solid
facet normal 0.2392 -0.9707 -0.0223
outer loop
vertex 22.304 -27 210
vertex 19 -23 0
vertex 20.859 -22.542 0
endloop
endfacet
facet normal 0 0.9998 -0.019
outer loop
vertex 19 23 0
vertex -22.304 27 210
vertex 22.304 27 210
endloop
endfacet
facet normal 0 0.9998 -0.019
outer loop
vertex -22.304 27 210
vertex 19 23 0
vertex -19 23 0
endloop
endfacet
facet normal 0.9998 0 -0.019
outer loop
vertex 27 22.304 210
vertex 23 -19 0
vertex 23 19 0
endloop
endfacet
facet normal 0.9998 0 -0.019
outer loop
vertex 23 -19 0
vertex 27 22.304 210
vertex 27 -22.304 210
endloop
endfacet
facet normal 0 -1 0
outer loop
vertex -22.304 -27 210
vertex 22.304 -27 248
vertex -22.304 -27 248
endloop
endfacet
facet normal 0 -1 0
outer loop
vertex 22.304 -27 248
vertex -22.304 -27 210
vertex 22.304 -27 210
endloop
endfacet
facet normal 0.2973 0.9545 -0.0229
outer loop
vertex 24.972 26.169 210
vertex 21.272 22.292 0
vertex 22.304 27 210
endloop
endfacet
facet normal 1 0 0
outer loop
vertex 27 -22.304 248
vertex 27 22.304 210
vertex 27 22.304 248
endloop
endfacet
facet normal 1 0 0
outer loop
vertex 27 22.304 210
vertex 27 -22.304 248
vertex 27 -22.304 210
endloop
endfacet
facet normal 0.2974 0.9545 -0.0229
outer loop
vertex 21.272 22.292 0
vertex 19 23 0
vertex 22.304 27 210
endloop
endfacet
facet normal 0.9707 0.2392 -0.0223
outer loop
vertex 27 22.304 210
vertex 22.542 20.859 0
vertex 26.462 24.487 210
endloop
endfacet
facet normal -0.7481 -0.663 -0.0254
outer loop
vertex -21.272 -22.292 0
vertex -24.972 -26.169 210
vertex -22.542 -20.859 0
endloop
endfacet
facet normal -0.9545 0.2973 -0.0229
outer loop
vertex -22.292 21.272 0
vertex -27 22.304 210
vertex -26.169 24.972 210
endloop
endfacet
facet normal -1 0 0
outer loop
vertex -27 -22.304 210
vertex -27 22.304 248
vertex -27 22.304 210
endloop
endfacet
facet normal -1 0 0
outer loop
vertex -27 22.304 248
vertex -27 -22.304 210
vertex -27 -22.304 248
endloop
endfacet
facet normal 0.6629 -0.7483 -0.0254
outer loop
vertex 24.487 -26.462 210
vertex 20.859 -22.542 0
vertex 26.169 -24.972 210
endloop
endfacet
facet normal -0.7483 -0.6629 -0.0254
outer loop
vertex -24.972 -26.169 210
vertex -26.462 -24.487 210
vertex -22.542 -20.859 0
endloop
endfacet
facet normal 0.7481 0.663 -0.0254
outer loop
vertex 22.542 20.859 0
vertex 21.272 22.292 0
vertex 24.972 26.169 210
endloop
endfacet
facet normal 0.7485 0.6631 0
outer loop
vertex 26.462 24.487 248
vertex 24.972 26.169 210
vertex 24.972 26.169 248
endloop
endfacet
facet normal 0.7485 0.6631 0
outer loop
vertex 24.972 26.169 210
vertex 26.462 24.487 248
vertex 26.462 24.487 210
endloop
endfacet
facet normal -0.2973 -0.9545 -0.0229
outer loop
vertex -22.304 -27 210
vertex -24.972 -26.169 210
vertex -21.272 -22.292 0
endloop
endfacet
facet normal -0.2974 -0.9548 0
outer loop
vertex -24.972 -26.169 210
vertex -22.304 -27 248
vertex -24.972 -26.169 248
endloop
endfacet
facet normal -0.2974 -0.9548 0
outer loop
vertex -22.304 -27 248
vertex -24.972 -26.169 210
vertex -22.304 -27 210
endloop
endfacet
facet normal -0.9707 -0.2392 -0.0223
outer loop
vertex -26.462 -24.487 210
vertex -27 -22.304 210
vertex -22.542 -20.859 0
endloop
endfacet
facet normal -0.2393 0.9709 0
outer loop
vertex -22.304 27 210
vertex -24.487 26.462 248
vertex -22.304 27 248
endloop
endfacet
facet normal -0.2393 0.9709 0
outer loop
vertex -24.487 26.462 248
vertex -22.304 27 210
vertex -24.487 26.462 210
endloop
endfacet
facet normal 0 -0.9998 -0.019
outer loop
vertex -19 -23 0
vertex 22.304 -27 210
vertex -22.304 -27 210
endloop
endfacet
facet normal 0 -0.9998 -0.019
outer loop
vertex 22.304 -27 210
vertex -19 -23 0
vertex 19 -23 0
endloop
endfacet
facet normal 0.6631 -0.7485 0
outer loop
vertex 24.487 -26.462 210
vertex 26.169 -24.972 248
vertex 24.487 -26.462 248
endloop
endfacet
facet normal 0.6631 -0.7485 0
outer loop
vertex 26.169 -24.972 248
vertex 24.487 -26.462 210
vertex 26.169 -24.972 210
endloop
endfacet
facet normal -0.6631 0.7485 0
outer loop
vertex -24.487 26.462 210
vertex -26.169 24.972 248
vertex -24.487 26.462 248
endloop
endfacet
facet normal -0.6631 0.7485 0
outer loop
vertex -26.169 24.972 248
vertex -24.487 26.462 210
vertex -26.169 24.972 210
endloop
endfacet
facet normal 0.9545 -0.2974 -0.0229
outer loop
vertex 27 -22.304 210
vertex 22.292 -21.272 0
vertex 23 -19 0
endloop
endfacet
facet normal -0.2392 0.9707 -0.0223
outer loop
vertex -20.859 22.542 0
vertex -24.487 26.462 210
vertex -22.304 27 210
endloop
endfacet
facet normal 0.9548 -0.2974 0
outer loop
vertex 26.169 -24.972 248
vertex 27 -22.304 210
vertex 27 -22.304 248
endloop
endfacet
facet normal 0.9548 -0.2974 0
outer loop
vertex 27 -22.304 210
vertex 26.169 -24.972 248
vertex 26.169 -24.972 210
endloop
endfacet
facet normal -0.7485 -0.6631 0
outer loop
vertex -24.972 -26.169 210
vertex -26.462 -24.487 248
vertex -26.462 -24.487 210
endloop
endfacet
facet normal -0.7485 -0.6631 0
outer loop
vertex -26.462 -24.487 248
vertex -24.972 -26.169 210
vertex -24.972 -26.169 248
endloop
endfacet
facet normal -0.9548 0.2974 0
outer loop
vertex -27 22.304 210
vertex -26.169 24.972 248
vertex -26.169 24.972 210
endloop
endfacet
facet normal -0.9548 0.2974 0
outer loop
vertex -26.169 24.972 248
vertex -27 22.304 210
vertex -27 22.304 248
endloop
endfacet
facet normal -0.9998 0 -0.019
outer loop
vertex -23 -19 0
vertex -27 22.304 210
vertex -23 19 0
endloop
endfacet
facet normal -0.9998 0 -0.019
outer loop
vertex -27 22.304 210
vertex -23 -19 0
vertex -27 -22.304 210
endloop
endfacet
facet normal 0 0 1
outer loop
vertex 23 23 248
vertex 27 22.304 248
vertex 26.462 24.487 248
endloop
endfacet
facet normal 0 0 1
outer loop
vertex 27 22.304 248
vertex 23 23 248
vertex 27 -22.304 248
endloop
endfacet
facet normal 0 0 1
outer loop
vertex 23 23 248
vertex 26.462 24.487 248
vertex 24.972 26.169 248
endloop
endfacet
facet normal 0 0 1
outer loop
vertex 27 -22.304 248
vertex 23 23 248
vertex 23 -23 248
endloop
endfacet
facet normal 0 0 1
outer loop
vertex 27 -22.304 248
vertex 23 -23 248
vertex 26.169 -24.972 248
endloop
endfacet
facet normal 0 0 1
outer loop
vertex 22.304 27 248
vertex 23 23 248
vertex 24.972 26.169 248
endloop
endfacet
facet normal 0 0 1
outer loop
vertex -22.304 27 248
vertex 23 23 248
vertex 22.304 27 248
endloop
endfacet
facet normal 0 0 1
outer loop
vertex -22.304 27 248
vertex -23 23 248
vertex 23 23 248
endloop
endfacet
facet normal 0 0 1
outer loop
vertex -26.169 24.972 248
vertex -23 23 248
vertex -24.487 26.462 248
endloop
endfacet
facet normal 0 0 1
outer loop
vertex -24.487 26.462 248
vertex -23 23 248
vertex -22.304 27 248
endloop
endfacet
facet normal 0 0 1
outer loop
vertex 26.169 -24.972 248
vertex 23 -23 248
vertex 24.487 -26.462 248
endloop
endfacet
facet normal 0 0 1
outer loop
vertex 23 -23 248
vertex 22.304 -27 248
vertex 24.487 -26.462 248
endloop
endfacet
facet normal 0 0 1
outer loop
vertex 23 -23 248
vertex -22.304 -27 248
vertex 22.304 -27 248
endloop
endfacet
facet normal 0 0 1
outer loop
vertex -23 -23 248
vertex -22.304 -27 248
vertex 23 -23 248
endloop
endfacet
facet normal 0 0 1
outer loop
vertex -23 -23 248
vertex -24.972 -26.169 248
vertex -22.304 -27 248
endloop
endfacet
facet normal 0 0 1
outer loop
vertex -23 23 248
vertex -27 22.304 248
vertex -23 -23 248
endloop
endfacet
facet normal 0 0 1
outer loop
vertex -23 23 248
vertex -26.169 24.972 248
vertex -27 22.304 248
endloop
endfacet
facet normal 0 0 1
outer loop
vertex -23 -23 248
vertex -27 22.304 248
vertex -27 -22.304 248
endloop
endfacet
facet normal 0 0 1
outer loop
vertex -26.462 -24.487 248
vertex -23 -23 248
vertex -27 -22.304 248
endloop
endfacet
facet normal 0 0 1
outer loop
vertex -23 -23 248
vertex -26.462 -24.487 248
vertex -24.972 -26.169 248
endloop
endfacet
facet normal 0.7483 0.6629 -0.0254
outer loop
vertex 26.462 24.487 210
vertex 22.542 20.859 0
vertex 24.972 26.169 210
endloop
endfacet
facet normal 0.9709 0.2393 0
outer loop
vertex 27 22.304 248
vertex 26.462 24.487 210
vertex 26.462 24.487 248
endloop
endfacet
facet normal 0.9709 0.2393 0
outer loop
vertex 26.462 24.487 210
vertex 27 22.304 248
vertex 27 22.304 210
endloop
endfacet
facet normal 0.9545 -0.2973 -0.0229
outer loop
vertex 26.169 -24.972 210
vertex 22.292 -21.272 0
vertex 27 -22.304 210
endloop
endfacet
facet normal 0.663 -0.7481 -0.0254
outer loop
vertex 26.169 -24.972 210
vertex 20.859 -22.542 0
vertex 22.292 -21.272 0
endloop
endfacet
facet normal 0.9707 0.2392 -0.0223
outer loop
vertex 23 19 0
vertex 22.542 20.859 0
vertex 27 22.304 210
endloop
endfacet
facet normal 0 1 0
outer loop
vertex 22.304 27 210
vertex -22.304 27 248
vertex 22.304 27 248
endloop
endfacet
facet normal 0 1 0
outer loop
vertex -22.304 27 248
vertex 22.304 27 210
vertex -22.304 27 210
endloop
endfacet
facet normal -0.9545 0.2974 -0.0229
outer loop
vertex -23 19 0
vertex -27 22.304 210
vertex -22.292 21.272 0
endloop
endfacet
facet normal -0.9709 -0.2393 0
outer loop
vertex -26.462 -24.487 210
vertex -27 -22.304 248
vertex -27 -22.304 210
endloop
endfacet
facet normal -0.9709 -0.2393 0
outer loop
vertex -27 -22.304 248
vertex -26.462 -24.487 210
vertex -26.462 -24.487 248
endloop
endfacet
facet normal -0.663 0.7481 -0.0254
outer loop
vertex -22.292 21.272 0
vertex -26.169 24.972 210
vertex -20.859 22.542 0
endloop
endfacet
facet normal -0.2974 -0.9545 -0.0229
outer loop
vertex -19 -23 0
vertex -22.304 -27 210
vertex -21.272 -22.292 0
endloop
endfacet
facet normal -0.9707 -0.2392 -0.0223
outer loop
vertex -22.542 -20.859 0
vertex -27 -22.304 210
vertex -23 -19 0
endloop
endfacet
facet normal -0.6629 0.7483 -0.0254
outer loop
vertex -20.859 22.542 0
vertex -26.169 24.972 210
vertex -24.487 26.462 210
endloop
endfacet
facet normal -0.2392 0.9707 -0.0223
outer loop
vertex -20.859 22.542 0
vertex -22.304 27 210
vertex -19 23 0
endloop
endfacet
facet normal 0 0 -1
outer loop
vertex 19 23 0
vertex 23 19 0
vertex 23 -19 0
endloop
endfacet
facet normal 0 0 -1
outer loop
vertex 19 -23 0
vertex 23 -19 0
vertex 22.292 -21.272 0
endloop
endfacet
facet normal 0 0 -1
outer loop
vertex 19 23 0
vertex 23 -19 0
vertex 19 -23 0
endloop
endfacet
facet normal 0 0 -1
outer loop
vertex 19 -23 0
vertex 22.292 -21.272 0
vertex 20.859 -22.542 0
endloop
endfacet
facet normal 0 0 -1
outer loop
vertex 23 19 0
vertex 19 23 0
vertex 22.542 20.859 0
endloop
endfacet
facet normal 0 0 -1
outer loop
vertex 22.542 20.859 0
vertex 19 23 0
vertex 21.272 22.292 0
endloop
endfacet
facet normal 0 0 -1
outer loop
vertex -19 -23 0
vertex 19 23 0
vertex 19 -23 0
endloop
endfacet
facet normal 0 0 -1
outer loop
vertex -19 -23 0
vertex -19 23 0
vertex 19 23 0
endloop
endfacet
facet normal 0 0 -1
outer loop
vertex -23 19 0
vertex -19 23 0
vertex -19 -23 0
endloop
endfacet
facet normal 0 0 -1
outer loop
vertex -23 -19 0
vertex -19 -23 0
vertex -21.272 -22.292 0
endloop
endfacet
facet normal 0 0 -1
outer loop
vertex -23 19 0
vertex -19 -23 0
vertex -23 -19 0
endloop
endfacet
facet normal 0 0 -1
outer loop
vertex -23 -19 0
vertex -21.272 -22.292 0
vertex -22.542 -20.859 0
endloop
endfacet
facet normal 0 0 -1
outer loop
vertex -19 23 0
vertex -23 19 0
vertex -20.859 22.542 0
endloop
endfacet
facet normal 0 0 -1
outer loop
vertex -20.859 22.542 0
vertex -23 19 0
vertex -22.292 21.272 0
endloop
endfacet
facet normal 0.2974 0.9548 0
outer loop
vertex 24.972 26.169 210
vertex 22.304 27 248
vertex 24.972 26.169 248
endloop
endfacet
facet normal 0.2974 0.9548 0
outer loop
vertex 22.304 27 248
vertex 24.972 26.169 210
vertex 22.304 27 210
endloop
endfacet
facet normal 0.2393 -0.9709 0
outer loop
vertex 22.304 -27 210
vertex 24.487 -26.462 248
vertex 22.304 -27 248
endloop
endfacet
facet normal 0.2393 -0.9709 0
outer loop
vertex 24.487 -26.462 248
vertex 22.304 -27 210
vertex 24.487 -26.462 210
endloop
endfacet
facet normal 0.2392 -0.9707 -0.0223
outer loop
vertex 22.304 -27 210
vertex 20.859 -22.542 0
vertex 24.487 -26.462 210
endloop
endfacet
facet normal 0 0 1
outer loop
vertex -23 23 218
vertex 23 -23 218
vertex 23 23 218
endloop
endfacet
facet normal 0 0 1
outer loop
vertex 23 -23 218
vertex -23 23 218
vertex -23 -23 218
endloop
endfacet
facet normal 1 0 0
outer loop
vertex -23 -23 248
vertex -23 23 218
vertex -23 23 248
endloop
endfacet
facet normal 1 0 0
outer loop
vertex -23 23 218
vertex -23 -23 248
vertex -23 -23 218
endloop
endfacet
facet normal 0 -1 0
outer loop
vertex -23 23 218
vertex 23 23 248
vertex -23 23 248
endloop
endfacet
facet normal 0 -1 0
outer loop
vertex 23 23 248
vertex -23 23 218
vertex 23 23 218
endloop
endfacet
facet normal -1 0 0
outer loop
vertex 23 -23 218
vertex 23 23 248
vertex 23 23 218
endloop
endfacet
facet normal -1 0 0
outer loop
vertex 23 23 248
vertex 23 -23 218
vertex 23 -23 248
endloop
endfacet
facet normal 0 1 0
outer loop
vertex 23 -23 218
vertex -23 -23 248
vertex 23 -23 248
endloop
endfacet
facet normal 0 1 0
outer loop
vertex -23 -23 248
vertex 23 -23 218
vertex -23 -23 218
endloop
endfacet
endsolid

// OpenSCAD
leg_bottom_len = 46; // Furniture leg bottom length
leg_bottom_wid = 46; // Furniture leg bottom width
sleeve_len = 30;     // Distance cap slips onto leg
extend_len = 210;    // Leg extension length (0 for cap only)
wall_thick = 4;      // Thickness of cap walls
leg_smoothing = 4;

module wantRect(l, w) {
    translate([-w/2,-l/2,0])
        square([w, l]);
}

module legCapSolid(h=sleeve_len) {
    linear_extrude(h)
        wantRect(leg_bottom_len, leg_bottom_wid);
}

module legCapSolidSmooth(h=sleeve_len) {
    linear_extrude(h)
        offset(leg_smoothing) offset(-leg_smoothing)
        wantRect(leg_bottom_len, leg_bottom_wid);
}

module legCap() {
    scale_x = (leg_bottom_len+(2*wall_thick))/leg_bottom_len;
    scale_y = (leg_bottom_wid+(2*wall_thick))/leg_bottom_wid;
    scale_z = (sleeve_len+(2*wall_thick))/sleeve_len;
    
    difference() {
        scale([scale_x, scale_y, scale_z])
            legCapSolidSmooth();
        translate([0,0,wall_thick])
            legCapSolid(sleeve_len+wall_thick);
    }
}

module legExtension() {
    linear_extrude(extend_len)
        offset(leg_smoothing) offset(-leg_smoothing)
        wantRect(leg_bottom_len, leg_bottom_wid);
}

module capAndExtension() {
    difference() {
    hull() {
        translate([0,0,extend_len])
            legCap();
        legExtension();
    }
    translate([0,0,extend_len+2*wall_thick])
    legCapSolid();
    }
}

//difference() {
if (extend_len)
    capAndExtension();
else
    legCap();
//cube(1000);
//}
